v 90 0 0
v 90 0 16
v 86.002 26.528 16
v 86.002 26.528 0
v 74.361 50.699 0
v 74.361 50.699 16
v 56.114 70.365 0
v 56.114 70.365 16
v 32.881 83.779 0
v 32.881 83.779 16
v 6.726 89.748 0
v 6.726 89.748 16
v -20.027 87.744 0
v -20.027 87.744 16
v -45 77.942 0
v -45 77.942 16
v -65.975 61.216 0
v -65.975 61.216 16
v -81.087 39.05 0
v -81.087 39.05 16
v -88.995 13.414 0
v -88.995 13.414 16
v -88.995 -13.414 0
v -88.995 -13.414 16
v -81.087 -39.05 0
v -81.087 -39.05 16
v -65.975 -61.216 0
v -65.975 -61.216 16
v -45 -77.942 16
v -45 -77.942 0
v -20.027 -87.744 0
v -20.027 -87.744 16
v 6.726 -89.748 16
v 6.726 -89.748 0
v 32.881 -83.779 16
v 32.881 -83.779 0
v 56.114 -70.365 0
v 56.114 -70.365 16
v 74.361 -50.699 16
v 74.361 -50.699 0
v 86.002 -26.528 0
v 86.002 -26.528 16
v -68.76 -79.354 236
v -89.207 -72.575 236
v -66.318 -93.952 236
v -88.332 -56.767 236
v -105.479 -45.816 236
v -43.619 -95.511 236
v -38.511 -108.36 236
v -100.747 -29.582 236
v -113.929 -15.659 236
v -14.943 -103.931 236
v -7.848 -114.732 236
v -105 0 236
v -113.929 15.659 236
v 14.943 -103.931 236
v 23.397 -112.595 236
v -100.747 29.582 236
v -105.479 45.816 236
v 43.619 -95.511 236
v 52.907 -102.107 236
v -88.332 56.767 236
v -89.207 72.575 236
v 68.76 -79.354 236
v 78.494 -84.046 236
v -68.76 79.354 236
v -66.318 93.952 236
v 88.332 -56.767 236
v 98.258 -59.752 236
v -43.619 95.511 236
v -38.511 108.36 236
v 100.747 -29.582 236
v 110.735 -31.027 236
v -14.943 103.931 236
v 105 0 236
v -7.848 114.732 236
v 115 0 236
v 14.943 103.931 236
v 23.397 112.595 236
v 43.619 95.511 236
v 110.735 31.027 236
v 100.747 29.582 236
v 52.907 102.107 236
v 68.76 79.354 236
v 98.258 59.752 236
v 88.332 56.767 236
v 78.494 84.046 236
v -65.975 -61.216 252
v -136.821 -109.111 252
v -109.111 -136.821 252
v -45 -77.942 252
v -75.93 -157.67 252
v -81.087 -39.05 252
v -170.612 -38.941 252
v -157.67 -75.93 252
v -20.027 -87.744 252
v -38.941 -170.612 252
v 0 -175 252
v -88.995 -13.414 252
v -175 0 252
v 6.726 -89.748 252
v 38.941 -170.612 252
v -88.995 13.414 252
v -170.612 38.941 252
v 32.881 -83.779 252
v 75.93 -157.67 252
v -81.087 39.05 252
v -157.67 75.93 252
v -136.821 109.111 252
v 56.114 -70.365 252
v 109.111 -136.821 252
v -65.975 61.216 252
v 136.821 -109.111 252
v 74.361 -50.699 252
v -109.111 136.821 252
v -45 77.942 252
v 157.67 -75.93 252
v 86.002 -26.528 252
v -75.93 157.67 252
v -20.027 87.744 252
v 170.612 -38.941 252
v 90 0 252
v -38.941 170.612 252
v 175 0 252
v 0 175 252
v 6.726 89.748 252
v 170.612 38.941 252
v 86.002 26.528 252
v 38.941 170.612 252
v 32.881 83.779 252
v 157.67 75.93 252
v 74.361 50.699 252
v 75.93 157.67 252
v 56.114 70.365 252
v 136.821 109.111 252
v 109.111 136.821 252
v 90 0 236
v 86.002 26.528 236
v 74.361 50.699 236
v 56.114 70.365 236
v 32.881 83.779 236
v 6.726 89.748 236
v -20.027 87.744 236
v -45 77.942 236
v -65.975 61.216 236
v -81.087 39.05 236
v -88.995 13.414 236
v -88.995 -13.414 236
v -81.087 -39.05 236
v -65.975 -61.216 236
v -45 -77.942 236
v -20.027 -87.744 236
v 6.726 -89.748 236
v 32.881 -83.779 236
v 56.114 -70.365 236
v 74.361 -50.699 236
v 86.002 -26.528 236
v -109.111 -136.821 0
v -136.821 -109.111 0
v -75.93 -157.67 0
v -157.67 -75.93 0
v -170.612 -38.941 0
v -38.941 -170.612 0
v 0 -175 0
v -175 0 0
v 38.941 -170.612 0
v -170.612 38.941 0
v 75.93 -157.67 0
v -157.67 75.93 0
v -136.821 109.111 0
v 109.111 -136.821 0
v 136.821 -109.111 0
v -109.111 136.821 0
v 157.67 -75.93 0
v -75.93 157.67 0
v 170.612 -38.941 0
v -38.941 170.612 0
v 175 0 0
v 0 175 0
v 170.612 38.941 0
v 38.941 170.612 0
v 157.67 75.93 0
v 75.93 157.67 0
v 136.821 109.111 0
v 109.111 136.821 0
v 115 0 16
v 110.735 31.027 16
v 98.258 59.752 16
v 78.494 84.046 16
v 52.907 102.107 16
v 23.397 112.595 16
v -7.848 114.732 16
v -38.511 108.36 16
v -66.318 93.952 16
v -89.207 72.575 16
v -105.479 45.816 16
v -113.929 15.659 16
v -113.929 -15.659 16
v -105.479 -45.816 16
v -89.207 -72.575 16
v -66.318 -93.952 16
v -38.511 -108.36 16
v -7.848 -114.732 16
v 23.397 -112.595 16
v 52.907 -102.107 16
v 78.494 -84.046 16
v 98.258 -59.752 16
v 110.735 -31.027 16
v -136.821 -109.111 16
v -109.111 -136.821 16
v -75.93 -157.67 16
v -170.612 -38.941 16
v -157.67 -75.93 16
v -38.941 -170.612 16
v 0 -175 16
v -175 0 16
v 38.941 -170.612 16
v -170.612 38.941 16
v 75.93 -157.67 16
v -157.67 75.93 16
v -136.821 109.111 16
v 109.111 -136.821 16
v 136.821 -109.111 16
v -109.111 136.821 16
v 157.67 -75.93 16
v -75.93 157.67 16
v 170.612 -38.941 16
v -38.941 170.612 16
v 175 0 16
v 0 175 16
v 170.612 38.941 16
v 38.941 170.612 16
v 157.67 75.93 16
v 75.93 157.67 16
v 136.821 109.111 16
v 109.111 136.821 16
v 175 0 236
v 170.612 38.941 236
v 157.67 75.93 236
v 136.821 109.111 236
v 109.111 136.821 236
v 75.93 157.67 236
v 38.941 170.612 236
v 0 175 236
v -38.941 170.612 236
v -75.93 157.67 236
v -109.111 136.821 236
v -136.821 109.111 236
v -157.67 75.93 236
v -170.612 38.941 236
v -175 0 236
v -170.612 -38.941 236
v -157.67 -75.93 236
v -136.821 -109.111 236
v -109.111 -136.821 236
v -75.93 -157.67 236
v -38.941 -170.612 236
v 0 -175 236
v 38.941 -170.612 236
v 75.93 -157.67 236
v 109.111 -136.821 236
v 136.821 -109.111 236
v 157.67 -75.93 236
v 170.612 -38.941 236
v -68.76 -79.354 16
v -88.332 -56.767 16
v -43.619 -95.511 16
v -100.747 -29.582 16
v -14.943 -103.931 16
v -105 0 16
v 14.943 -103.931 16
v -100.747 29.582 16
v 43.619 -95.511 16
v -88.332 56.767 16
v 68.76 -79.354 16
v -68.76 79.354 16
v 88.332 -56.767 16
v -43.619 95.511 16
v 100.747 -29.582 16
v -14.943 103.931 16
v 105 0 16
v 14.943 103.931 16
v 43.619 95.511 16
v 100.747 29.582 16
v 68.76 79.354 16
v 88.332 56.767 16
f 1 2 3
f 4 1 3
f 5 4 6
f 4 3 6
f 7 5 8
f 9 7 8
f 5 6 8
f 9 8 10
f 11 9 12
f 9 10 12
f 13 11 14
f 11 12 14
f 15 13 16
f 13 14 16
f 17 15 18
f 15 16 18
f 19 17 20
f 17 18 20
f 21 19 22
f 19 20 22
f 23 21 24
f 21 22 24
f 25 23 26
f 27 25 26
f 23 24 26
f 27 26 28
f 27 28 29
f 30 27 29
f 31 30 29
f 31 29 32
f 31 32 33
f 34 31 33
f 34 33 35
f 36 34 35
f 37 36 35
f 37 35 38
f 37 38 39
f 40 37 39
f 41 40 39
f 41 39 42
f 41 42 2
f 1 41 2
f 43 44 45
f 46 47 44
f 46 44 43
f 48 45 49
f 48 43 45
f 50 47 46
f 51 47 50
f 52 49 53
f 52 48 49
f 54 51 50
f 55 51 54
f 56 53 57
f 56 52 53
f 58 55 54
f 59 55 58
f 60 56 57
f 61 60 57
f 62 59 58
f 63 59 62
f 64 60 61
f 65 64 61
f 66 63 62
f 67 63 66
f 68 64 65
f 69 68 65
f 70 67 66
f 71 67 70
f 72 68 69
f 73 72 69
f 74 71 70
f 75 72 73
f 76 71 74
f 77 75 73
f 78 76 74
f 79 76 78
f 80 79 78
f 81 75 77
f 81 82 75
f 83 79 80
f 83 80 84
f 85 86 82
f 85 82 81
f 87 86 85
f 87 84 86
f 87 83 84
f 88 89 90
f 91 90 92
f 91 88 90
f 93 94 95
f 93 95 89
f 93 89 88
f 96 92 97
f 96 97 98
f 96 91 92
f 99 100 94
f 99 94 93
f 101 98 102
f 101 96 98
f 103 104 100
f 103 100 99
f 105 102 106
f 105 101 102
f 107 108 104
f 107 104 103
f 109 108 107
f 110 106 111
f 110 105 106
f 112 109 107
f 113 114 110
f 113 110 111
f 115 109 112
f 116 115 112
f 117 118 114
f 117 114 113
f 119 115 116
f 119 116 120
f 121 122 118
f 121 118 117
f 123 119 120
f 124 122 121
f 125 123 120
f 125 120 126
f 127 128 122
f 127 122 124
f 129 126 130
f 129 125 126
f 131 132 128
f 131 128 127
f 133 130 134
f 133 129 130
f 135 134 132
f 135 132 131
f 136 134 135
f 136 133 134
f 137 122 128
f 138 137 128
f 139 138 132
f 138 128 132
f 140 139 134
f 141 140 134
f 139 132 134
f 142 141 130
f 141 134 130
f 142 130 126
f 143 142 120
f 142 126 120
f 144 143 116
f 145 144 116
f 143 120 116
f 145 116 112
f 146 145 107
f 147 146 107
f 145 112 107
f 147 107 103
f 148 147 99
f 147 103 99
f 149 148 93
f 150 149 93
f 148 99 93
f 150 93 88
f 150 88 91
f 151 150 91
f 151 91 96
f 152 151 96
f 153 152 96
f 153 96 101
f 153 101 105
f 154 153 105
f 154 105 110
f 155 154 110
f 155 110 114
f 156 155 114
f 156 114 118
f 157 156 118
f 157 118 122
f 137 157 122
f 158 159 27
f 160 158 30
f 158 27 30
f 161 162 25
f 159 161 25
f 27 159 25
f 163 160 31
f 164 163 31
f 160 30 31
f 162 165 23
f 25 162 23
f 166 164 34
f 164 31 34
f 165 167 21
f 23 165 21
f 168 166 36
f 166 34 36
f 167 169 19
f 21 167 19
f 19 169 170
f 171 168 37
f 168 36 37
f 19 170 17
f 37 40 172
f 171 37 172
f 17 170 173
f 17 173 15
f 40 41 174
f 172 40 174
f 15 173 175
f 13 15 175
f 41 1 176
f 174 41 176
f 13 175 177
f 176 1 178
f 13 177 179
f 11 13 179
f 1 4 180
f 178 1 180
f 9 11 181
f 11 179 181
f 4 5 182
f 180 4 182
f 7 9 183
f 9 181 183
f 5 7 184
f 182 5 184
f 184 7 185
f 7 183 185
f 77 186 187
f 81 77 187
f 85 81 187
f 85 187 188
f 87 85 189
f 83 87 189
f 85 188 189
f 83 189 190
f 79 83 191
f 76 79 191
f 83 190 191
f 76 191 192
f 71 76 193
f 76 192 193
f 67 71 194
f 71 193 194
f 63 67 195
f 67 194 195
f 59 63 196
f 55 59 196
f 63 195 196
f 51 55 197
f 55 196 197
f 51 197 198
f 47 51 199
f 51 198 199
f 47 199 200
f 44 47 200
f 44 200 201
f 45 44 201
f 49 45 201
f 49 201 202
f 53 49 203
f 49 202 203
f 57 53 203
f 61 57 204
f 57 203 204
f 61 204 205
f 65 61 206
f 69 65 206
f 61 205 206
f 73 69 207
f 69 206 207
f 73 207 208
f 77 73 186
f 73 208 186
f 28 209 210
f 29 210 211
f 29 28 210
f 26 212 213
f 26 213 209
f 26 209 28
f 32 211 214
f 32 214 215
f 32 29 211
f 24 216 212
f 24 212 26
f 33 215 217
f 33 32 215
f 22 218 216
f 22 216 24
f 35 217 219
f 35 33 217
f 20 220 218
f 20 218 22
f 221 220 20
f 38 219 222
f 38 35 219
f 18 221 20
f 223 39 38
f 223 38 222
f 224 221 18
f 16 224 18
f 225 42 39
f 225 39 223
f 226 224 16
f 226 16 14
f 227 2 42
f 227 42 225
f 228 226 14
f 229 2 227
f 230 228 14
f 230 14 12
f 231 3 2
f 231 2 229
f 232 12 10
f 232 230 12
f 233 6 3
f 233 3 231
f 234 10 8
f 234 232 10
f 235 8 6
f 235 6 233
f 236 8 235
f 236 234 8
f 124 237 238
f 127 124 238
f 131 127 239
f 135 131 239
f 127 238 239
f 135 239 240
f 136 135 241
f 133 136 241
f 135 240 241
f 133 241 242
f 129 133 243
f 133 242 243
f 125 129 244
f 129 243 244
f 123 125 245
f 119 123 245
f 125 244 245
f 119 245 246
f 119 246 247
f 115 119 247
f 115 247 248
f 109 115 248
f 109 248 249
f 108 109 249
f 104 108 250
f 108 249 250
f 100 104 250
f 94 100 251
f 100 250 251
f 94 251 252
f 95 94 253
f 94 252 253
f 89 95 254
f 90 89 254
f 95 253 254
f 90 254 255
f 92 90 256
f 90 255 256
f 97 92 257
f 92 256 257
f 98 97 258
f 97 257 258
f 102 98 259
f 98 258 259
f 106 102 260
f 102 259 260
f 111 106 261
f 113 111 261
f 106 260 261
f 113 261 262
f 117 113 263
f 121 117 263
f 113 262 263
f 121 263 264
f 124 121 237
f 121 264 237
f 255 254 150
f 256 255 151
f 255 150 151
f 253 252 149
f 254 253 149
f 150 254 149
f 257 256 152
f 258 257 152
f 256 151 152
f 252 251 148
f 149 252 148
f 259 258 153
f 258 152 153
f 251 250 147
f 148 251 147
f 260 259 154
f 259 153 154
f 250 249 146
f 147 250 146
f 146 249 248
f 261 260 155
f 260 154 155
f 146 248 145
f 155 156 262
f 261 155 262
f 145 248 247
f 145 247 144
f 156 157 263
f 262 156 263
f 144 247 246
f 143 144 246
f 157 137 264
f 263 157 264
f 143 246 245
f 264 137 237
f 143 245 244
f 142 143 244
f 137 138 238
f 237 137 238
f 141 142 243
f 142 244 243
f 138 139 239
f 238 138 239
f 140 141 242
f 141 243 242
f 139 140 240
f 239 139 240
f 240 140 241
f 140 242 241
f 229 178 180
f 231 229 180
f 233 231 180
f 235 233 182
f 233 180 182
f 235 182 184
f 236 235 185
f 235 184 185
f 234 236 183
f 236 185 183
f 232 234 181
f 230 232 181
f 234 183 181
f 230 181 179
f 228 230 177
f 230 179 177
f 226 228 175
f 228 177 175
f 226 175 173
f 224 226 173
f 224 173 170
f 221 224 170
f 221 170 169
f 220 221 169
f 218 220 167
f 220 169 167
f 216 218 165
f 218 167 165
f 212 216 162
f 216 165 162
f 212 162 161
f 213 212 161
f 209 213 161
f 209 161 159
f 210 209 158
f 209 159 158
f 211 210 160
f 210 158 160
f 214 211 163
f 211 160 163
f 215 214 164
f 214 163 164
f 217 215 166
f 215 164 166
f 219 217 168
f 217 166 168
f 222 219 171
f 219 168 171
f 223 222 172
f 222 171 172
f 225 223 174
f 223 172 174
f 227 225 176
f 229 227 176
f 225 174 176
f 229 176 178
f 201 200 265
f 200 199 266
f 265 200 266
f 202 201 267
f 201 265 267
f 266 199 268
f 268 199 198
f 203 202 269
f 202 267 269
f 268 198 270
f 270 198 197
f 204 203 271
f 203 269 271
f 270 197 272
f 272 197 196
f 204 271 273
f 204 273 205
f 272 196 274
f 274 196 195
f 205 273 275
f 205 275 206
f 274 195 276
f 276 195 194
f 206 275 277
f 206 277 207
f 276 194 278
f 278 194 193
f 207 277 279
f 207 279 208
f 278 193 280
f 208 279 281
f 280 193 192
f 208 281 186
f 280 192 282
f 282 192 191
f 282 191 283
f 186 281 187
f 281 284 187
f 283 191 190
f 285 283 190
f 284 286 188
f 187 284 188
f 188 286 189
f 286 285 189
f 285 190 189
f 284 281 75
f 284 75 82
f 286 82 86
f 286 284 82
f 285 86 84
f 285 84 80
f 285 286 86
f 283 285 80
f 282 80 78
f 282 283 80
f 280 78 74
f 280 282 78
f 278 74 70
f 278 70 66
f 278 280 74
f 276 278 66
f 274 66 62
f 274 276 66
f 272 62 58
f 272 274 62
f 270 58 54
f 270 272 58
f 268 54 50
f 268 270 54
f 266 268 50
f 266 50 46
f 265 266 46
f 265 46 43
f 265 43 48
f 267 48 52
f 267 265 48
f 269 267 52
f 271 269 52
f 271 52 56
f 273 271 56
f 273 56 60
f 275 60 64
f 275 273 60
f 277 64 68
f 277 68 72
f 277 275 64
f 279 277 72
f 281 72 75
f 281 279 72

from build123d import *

# Parameters (mm, degrees)
SKETCH_1_R          = 175
EXTRUDE_1_DEPTH     = 16
SKETCH_2_R          = 115
SKETCH_2_R_2        = 105
EXTRUDE_2_DEPTH     = 220
SKETCH_3_R          = 175
EXTRUDE_3_DEPTH     = 16
SKETCH_4_R          = 90
CUT_EXTRUDE_1_DEPTH = 354.205322723


with BuildPart() as part:
    # 草图1 → 凸台-拉伸1 (new body)
    with BuildSketch(Plane.XY):
        Circle(SKETCH_1_R)
    extrude(amount=EXTRUDE_1_DEPTH)


with BuildPart() as body_2:
    # 草图2 → 凸台-拉伸2 (new body)
    with BuildSketch(Plane.XY.offset(16)):
        Circle(SKETCH_2_R)
        Circle(SKETCH_2_R_2, mode=Mode.SUBTRACT)
    extrude(amount=EXTRUDE_2_DEPTH)


with BuildPart() as body_3:
    # 草图3 → 凸台-拉伸3 (new body)
    with BuildSketch(Plane.XY.offset(236)):
        Circle(SKETCH_3_R)
    extrude(amount=EXTRUDE_3_DEPTH)


with BuildPart() as cut_extrude_1_tool:
    # 草图4 → 切除-拉伸1 (new, through all)
    with BuildSketch(Plane.XY.offset(252)):
        Circle(SKETCH_4_R)
    extrude(amount=-CUT_EXTRUDE_1_DEPTH)


with BuildPart() as part_1:
    add(part.part)

    # 切除-拉伸1: cut by cut_extrude_1_tool
    add(cut_extrude_1_tool.part, mode=Mode.SUBTRACT)


with BuildPart() as body_3_1:
    add(body_3.part)

    # 切除-拉伸1: cut by cut_extrude_1_tool
    add(cut_extrude_1_tool.part, mode=Mode.SUBTRACT)


solid = Compound([body_2.part, part_1.part, body_3_1.part])
